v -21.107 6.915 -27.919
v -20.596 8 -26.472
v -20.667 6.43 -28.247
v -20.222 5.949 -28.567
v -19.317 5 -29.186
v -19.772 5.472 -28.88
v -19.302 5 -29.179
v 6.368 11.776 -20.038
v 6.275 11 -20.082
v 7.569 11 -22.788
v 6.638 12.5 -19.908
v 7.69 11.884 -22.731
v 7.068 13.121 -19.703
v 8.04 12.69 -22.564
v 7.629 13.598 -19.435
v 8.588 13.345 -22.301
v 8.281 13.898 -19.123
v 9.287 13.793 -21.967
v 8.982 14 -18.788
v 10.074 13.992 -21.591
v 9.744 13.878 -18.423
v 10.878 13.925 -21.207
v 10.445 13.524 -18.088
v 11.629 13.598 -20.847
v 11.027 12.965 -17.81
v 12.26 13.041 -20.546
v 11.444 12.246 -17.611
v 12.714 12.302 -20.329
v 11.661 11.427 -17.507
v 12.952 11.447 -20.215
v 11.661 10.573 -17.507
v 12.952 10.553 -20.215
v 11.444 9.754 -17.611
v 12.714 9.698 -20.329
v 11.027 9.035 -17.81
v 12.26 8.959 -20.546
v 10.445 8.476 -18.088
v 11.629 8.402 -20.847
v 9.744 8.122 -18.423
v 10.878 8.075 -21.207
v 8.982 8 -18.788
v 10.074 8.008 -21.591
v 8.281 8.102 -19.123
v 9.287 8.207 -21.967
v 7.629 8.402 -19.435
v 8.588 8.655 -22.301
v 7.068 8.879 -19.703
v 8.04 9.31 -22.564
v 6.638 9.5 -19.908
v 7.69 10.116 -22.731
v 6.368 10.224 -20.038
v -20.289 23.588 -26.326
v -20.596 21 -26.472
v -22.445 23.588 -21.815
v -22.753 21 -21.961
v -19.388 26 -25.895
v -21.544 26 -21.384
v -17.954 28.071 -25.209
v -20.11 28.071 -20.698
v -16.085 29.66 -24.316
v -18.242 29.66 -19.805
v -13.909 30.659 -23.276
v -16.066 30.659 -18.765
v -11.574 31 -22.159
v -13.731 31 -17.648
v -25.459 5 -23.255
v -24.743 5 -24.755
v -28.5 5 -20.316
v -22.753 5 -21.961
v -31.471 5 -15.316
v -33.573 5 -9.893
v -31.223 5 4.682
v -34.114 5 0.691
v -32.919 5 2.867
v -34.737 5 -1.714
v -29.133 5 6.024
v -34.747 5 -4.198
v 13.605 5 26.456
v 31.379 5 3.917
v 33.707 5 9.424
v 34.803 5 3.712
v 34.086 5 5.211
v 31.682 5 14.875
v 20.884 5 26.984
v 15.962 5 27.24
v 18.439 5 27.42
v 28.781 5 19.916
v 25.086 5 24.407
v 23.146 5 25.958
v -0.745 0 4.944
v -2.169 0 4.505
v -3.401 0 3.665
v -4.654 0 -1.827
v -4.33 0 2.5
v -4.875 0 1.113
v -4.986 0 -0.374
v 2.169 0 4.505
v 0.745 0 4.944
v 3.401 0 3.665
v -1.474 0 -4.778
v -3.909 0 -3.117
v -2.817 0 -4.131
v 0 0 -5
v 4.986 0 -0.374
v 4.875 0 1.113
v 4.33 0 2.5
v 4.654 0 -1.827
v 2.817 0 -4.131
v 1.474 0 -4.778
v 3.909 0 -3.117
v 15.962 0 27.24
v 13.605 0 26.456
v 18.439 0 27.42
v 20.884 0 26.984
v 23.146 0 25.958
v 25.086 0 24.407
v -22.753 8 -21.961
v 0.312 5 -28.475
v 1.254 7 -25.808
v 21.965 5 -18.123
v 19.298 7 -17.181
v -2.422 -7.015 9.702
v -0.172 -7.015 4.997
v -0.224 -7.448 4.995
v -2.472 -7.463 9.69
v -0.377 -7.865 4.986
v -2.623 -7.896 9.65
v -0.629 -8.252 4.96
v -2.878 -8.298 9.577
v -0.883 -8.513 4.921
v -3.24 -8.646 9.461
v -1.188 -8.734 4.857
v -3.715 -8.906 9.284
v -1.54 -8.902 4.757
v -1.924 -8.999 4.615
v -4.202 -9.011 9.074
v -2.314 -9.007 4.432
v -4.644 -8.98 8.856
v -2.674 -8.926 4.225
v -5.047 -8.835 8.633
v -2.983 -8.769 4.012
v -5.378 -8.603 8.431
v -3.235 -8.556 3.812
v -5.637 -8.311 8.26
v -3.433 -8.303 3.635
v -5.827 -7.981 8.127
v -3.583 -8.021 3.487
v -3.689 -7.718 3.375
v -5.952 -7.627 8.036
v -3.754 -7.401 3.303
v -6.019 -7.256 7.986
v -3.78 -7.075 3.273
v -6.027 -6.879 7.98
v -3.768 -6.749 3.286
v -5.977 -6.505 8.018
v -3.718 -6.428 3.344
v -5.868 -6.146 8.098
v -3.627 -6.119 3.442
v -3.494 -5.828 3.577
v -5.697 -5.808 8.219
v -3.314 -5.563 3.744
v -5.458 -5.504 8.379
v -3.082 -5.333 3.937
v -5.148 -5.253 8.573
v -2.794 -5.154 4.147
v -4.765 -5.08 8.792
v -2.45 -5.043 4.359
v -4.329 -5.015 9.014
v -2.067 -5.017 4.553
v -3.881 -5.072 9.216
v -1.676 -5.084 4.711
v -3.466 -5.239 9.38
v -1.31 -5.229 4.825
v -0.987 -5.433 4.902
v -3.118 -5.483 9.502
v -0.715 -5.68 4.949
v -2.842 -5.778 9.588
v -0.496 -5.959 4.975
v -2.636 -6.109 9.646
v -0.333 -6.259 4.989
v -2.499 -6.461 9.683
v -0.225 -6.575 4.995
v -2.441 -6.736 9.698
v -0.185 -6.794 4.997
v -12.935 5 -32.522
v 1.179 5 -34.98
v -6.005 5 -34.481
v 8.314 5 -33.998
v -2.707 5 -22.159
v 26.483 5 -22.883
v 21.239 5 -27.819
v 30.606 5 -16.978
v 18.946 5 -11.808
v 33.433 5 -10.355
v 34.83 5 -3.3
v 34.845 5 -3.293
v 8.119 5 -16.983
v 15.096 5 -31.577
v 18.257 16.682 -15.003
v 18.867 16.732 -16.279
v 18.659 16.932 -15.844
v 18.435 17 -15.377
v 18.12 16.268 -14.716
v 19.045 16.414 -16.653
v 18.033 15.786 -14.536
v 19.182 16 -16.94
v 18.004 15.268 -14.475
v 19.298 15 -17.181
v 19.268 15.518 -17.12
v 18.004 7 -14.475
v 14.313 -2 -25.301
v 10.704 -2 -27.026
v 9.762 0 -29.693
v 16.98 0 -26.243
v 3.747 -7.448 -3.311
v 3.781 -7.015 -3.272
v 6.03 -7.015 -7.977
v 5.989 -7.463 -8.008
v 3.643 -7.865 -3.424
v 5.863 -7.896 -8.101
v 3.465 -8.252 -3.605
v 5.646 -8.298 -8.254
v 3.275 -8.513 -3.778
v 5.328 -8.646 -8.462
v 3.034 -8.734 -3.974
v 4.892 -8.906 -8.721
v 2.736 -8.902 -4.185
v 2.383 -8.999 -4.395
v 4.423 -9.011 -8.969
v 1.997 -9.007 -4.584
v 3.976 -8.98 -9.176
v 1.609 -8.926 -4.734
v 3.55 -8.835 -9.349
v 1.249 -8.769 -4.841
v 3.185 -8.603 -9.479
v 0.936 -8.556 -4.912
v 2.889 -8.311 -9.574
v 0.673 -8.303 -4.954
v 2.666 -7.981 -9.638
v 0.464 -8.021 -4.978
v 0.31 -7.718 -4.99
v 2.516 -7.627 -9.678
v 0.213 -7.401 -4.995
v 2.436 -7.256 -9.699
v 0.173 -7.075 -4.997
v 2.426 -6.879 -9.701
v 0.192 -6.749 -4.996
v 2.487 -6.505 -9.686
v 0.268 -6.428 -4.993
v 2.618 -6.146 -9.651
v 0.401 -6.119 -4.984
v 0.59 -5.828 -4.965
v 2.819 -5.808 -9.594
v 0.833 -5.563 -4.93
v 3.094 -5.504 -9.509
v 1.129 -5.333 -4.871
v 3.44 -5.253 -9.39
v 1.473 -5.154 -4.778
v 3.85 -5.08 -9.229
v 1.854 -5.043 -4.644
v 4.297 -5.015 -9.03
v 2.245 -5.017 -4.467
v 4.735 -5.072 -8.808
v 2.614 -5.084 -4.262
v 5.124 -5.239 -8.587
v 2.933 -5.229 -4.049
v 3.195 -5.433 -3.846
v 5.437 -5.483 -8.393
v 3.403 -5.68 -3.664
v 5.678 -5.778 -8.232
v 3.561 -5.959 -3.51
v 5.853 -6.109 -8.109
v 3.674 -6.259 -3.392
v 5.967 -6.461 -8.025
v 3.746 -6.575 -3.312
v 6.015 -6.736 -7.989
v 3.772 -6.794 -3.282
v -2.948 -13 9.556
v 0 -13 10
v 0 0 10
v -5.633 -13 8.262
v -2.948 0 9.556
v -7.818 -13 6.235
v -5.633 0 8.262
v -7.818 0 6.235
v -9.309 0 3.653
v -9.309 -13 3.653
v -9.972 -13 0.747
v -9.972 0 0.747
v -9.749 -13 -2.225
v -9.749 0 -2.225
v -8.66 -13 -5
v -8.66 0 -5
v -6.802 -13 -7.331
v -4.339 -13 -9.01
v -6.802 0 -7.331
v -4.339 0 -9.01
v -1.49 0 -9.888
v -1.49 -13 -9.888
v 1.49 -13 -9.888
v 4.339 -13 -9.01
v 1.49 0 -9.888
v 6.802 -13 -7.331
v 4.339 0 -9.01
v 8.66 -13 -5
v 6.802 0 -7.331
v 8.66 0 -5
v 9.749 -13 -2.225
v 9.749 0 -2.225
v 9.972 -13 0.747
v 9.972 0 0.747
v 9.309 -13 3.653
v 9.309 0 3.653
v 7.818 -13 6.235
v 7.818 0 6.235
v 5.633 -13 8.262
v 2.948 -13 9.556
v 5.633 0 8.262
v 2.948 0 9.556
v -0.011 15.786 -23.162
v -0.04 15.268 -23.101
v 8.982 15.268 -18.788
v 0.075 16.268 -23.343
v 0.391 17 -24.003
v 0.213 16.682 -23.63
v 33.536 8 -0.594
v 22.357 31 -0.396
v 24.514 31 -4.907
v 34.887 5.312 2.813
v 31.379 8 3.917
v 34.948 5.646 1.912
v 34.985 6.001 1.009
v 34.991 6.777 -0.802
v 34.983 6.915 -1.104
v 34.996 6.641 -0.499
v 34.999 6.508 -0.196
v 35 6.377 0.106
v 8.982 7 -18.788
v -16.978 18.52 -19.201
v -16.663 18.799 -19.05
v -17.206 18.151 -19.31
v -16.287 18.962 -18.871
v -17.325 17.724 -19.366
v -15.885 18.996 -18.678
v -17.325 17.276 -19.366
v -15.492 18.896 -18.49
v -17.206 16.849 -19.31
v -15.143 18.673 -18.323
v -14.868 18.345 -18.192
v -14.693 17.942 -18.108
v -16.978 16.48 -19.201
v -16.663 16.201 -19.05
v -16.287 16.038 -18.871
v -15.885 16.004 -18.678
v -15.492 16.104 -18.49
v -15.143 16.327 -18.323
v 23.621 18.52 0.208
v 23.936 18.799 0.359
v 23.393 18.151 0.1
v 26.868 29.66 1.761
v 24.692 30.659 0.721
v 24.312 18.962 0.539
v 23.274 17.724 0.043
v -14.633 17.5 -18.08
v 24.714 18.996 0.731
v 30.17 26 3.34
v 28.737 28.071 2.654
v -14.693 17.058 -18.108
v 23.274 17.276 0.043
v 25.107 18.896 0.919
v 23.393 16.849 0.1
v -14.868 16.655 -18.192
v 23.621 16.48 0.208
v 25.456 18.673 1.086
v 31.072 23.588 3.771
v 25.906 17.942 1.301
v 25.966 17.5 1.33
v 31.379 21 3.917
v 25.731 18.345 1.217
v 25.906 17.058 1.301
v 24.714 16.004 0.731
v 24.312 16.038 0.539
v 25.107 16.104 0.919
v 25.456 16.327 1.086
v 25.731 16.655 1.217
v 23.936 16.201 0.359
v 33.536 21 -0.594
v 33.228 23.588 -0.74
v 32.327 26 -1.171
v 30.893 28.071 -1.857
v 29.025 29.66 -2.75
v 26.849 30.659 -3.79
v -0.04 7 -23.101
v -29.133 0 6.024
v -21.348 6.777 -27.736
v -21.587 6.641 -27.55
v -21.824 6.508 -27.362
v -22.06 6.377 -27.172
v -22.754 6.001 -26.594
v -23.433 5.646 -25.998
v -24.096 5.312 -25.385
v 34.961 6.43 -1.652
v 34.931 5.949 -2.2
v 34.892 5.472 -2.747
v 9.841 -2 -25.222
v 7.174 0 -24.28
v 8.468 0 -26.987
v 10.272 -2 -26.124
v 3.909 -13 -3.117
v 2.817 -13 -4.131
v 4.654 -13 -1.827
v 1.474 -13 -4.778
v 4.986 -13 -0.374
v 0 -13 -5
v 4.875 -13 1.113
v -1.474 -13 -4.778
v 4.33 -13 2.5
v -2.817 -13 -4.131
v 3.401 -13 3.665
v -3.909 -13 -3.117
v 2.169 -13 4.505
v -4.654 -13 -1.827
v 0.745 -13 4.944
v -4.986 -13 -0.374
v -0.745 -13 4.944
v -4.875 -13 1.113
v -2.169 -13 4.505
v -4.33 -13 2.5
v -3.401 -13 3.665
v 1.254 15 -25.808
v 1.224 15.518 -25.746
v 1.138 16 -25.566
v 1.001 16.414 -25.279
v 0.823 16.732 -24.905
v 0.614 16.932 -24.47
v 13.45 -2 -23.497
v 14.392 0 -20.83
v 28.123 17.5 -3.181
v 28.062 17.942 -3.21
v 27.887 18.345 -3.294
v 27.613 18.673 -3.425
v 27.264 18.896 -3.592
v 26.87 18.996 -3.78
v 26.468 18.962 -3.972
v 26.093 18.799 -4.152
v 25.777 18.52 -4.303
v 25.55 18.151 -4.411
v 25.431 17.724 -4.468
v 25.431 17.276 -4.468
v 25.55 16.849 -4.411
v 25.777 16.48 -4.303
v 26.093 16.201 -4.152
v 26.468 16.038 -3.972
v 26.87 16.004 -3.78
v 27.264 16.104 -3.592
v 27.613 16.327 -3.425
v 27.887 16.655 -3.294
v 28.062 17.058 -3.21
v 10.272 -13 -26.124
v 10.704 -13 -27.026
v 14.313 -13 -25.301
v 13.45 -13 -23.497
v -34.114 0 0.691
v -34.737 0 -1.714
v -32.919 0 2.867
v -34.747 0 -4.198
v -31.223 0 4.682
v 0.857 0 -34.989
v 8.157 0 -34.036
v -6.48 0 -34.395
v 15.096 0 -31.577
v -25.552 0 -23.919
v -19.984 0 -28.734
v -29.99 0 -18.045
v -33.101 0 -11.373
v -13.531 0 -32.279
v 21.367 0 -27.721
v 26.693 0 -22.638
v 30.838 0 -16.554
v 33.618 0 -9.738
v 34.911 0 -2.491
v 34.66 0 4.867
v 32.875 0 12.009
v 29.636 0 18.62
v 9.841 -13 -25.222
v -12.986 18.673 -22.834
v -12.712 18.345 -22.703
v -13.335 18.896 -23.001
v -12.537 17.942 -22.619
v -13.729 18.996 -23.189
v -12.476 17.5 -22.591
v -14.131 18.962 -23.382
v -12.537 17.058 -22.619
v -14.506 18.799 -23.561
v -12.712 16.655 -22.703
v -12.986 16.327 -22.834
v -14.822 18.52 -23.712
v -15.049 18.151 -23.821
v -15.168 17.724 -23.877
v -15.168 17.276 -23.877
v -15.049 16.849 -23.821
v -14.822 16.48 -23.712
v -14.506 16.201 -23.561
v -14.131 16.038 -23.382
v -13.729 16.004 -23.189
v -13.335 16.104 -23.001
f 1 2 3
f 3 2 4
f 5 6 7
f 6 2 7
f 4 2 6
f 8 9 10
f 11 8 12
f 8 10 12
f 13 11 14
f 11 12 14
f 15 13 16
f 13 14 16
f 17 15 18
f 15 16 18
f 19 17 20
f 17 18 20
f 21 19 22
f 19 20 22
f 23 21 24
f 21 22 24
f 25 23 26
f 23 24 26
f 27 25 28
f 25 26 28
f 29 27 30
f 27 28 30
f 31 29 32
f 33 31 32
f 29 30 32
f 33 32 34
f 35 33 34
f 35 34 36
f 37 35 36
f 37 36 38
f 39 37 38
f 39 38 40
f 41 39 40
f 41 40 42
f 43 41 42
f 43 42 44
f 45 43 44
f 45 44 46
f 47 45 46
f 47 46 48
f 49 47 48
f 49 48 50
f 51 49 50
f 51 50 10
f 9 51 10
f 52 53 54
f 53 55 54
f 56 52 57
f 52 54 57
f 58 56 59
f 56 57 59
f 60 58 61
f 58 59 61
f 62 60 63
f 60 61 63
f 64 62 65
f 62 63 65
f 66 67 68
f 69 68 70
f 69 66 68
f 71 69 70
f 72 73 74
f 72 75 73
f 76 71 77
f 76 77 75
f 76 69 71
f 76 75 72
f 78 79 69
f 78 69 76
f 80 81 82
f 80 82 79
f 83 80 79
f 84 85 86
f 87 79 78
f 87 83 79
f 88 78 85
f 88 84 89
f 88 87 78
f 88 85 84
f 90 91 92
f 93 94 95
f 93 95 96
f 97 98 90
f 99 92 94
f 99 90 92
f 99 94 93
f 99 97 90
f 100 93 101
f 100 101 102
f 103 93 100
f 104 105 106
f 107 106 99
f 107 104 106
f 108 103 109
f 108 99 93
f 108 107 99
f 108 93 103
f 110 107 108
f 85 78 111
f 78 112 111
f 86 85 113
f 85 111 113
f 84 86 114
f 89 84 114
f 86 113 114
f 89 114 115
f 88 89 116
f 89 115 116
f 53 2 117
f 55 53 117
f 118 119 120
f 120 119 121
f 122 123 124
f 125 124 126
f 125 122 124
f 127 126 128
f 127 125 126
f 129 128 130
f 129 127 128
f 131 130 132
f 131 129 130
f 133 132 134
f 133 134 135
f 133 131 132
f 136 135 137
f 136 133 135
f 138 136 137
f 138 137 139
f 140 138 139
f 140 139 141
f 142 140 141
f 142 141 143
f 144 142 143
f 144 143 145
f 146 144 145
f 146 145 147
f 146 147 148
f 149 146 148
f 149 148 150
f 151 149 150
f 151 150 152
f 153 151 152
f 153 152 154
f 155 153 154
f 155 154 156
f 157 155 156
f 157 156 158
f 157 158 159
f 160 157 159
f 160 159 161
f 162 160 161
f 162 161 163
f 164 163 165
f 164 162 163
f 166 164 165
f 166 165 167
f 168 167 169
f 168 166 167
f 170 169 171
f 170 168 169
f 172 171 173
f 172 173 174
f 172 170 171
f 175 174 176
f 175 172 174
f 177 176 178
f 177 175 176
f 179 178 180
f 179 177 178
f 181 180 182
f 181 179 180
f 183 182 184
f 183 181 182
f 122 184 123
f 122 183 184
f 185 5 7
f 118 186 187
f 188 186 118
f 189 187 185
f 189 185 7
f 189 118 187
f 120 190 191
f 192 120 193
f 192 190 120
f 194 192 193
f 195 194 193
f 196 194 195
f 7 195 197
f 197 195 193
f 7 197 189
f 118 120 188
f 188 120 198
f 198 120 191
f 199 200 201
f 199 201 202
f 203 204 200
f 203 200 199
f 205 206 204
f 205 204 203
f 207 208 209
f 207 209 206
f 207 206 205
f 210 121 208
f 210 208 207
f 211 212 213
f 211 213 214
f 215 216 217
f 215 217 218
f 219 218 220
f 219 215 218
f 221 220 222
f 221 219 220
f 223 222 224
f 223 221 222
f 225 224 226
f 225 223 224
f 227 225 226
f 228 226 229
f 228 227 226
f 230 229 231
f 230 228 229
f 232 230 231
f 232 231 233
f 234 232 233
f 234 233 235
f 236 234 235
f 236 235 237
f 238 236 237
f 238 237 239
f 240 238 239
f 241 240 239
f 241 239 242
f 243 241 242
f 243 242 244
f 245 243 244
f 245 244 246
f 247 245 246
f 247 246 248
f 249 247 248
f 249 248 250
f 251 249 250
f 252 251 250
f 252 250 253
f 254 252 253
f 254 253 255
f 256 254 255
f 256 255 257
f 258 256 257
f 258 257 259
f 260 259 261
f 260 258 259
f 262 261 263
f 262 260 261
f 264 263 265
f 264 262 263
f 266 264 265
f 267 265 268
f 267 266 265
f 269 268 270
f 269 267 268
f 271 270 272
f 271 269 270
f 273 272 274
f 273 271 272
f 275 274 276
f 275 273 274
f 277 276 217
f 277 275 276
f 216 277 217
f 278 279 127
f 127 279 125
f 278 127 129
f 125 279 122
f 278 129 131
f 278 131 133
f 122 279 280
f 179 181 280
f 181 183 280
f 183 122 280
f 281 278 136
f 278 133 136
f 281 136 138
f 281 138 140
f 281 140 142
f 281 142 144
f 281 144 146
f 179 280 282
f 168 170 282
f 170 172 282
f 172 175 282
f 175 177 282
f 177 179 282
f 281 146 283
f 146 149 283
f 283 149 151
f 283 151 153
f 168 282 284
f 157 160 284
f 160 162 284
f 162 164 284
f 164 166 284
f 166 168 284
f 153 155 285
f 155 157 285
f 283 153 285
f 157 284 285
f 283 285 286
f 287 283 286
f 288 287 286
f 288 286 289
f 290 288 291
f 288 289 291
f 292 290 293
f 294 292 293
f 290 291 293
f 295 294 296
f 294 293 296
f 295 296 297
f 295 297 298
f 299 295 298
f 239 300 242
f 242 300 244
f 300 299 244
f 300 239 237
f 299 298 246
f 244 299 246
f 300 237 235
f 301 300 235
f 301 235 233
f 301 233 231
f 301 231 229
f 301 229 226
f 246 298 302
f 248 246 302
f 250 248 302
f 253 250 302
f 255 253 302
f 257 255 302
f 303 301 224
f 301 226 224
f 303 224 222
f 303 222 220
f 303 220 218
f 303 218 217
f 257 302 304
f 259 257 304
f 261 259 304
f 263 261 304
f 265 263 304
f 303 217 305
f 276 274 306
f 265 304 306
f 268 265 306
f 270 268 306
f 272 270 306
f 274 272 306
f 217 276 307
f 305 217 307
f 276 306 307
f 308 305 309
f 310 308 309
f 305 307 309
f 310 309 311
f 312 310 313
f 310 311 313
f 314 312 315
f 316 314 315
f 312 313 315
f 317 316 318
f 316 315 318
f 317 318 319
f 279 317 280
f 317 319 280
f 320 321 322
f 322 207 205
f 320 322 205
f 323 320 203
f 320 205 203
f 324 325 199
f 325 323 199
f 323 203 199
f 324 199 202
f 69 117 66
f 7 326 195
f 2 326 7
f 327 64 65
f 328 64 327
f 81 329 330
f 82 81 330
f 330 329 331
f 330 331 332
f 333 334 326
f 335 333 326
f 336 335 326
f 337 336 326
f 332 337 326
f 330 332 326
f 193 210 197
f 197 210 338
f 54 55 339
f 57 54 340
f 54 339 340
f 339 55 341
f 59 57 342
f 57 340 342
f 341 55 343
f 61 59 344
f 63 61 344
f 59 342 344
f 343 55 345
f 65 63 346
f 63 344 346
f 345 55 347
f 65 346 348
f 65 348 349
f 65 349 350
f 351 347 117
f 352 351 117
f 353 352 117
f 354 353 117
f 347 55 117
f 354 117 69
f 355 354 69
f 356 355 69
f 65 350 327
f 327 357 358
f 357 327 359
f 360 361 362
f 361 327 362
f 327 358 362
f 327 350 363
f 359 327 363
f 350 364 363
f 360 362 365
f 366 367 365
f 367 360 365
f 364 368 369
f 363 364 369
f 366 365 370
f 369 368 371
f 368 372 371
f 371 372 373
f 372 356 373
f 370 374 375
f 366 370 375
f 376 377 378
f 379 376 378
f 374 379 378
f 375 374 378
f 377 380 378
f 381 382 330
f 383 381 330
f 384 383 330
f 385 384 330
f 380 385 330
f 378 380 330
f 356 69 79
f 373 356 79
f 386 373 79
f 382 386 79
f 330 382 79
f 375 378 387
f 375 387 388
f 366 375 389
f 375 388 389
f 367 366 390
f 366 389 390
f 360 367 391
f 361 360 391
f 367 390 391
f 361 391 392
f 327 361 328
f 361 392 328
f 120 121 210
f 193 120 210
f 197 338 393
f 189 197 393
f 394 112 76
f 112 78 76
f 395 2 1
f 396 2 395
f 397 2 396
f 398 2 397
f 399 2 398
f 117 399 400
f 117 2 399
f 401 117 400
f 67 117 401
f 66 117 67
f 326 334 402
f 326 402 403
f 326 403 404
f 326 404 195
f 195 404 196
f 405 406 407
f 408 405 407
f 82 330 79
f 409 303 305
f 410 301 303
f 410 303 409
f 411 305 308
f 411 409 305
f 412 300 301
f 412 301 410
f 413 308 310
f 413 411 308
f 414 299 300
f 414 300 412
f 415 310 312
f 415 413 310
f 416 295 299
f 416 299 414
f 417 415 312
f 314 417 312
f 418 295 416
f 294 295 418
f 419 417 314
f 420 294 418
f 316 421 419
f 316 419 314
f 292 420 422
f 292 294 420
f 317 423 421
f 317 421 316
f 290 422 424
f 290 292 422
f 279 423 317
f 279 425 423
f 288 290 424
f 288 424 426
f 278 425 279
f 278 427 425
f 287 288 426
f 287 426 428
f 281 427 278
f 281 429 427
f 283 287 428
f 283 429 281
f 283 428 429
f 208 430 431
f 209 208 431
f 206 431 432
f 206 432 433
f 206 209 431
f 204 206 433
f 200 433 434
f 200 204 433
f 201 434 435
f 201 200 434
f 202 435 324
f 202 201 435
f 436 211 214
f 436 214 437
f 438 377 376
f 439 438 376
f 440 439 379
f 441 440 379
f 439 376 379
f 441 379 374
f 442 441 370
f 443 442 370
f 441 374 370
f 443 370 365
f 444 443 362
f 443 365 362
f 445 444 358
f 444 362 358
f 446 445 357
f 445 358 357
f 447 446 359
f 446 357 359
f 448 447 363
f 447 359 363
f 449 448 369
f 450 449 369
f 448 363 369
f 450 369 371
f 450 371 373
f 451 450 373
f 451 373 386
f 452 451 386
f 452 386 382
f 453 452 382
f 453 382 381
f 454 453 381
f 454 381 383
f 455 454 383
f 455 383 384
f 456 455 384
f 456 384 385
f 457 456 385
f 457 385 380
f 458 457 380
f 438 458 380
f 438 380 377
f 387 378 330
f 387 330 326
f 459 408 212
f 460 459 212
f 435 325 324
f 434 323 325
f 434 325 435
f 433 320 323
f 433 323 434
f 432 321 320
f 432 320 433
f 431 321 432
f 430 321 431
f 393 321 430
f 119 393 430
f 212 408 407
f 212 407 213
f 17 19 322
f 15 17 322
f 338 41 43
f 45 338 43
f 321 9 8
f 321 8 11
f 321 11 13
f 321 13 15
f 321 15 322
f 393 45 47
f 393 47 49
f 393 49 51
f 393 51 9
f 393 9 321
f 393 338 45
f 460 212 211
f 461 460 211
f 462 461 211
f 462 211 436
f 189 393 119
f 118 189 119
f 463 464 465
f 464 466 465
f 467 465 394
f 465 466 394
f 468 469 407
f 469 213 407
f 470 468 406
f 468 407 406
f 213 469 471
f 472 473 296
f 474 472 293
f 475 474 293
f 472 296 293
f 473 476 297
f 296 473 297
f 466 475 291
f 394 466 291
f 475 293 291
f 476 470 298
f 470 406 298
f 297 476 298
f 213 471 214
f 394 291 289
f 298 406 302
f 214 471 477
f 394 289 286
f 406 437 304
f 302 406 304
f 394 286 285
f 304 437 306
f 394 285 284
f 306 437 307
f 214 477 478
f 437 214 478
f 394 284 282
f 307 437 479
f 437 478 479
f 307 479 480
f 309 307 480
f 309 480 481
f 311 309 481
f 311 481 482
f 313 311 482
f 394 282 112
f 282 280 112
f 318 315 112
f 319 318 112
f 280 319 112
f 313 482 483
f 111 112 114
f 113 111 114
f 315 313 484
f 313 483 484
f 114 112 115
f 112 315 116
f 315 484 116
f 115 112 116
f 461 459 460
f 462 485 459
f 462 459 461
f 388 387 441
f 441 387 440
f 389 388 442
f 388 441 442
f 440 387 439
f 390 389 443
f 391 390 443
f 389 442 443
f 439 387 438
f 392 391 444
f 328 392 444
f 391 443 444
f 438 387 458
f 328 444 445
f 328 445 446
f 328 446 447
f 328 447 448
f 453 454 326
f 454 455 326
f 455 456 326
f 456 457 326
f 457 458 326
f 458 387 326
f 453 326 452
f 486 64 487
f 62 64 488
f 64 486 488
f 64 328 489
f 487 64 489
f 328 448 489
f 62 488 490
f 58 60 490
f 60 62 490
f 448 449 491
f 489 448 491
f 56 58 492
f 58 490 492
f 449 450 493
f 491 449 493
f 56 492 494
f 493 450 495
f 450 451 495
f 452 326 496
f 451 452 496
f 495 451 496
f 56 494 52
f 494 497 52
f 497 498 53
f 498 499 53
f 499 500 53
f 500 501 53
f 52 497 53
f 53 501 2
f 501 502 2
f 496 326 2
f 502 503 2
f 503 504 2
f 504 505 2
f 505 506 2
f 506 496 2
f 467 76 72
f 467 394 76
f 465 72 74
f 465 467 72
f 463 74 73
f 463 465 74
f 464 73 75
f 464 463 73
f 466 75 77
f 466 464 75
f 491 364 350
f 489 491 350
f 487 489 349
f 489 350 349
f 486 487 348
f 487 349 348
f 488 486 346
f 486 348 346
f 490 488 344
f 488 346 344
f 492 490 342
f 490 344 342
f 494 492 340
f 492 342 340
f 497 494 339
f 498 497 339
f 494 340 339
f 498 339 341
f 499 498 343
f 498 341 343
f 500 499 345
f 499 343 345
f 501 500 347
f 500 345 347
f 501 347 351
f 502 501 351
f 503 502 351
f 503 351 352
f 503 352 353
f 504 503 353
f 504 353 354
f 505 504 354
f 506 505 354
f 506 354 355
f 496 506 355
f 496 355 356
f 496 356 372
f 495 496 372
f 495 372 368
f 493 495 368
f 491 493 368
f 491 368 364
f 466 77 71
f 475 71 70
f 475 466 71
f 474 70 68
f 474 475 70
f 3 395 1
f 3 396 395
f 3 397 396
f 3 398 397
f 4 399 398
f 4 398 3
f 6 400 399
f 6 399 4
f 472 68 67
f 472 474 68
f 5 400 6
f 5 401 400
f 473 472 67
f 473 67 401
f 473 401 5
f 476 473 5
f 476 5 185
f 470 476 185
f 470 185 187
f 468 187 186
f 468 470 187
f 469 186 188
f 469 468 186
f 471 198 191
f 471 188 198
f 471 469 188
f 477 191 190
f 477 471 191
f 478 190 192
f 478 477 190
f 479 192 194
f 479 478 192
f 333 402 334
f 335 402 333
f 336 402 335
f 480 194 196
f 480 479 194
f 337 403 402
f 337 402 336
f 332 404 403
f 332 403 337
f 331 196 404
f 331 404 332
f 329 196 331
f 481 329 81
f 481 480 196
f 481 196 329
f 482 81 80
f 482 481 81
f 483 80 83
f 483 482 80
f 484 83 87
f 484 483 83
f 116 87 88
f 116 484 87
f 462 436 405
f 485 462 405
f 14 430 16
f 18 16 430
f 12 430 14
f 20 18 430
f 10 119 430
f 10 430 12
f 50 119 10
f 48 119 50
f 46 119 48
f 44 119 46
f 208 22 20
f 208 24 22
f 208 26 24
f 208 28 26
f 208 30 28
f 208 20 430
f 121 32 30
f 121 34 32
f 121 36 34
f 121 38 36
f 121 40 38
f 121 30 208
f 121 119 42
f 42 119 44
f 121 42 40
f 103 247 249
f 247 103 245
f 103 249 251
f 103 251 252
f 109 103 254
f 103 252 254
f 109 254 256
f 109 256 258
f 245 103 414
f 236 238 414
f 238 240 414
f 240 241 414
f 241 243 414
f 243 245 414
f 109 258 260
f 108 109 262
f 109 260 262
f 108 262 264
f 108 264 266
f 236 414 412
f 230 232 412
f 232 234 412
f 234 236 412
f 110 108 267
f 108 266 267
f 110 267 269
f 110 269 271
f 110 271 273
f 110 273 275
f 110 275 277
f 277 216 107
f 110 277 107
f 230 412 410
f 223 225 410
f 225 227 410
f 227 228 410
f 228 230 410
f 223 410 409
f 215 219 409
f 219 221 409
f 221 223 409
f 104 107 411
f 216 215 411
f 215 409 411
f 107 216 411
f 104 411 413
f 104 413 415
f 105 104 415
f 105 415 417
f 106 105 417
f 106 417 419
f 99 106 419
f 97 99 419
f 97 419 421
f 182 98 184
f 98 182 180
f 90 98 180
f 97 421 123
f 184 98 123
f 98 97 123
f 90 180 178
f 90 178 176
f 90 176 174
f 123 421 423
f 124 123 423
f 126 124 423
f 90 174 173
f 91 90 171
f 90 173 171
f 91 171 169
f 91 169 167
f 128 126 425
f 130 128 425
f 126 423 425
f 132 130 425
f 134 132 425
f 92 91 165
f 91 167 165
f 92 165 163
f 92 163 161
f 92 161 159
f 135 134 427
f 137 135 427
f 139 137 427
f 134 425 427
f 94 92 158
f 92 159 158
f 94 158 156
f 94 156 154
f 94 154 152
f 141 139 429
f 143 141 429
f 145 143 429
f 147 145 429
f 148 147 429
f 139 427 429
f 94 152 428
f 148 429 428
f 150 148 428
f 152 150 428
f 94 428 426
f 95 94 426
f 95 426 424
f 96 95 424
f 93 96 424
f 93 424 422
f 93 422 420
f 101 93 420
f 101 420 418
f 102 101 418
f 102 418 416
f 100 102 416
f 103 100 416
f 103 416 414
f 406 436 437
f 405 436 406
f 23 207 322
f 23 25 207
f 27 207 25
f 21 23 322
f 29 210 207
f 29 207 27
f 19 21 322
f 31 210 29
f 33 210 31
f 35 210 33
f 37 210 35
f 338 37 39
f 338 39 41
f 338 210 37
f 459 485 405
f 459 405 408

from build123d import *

# Parameters (mm, degrees)
ESBO_O1_R                 = 35
RESSALTO_EXTRUS_O1_DEPTH  = 5
ESBO_O3_R                 = 10
RESSALTO_EXTRUS_O3_DEPTH  = 13
ESBO_O4_R                 = 5
CORTE_EXTRUS_O1_DEPTH     = 13
RESSALTO_EXTRUS_O5_DEPTH  = 13
CORTE_EXTRUS_O6_START     = -11
CORTE_EXTRUS_O6_OUTLINE_R = 2
CORTE_EXTRUS_O6_DEPTH     = 22
CORTE_EXTRUS_O8_DEPTH     = 68.852738868
RESSALTO_EXTRUS_O7_DEPTH  = 26
ESBO_O19_R                = 1.5
CORTE_EXTRUS_O9_DEPTH     = 26
FILETE1_R                 = 10
FILETE2_R                 = 10
RESSALTO_EXTRUS_O9_DEPTH  = 12
CORTE_EXTRUS_O11_REACH    = 75.407
ESBO_O26_R                = 3
CHANFRO7_SIZE             = 3
CHANFRO8_SIZE             = 3
CHANFRO9_SIZE             = 3
CHANFRO10_SIZE            = 2
FILETE5_R                 = 2
FILETE6_R                 = 2
CHANFRO11_SIZE            = 2


with BuildPart() as part:
    # Esboço1 → Ressalto-extrusão1 (new body)
    with BuildSketch(Plane(origin=(0, 0, 0), x_dir=(1, 0, 0), z_dir=(0, 1, 0))):
        with Locations(Location((0, 0, 0), (0, 0, 270))):
            Circle(ESBO_O1_R)
    extrude(amount=RESSALTO_EXTRUS_O1_DEPTH)

    # Esboço3 → Ressalto-extrusão3 (add)
    with BuildSketch(Plane.XZ):
        with Locations(Location((0, 0, 0), (0, 0, 90))):
            Circle(ESBO_O3_R)
    extrude(amount=RESSALTO_EXTRUS_O3_DEPTH)

    # Esboço4 → Corte-extrusão1 (cut)
    with BuildSketch(Plane(origin=(0, -13, 0), x_dir=(-1, 0, 0), z_dir=(0, -1, 0))):
        with Locations(Location((0, 0, 0), (0, 0, 90))):
            Circle(ESBO_O4_R)
    extrude(amount=-CORTE_EXTRUS_O1_DEPTH, mode=Mode.SUBTRACT)

    # Esboço11 → Ressalto-extrusão5 (add)
    with BuildSketch(Plane.XZ):
        Polygon((10.27244843, -26.12425699), (10.703764509, -27.026457876), (14.312568056, -25.301193562), (13.449935899, -23.496791788), (9.841132351, -25.222056103), align=None)
    extrude(amount=RESSALTO_EXTRUS_O5_DEPTH)

    # Corte-extrusão6: read off the stored shape, not the designer's step
    # Corte-extrusão6 outline → Corte-extrusão6 (cut)
    with BuildSketch(Plane(origin=(0, 0, 0), x_dir=(0.9022008868624063, 0, 0.4313160786994702), z_dir=(0.43131607869947014, 0, -0.9022008868624064)).offset(CORTE_EXTRUS_O6_START)):
        with Locations((0, 7.014981428)):
            Circle(CORTE_EXTRUS_O6_OUTLINE_R)
    extrude(amount=CORTE_EXTRUS_O6_DEPTH, mode=Mode.SUBTRACT)

    # 3DSketch5 → Corte-extrusão8 (cut, through all)
    with BuildSketch(Plane(origin=(-8.247671749, -6.480100675, 16.008238046), x_dir=(0.7047714310013795, 0.6243195323179013, 0.3369307816312202), z_dir=(-0.43131607869947175, 0, 0.9022008868624055))):
        Polygon((0, 0), (-30.606987597, 24.461465293), (-10.703733889, 49.365069068), (51.063459474, 0), (31.160205765, -24.903603774), align=None)
    extrude(amount=CORTE_EXTRUS_O8_DEPTH, mode=Mode.SUBTRACT)

    # Esboço18 → Ressalto-extrusão7 (add)
    with BuildSketch(Plane(origin=(0, 5, 0), x_dir=(1, 0, 0), z_dir=(0, 1, 0))):
        Polygon((4.313160787, 9.022008869), (31.379187393, -3.917473492), (33.535767786, 0.593530942), (-20.596285425, 26.472495664), (-22.752865819, 21.96149123), align=None)
    extrude(amount=RESSALTO_EXTRUS_O7_DEPTH)

    # Esboço19 → Corte-extrusão9 (cut)
    with BuildSketch(Plane(origin=(4.313160787, 0, -9.022008869), x_dir=(0.9022008868624055, 0, 0.43131607869947175), z_dir=(-0.43131607869947175, 0, 0.9022008868624055))):
        with Locations((-22.5, 17.5)):
            Circle(ESBO_O19_R)
        with Locations((22.5, 17.5)):
            Circle(ESBO_O19_R)
    extrude(amount=-CORTE_EXTRUS_O9_DEPTH, mode=Mode.SUBTRACT)

    # Filete1
    filete1_edges = [part.edges().sort_by_distance(p)[0] for p in [
        (32.45747759, 31, 1.661971275),
        (-21.674575622, 31, -24.216993447),
    ]]
    fillet(filete1_edges, radius=FILETE1_R)

    # Filete2
    filete2_edges = [part.edges().sort_by_distance(p)[0] for p in [
        (19.317369696, 2.5, 29.18628493),
        (-34.844748529, 2.5, 3.292946997),
    ]]
    fillet(filete2_edges, radius=FILETE2_R)

    # Esboço25 → Ressalto-extrusão9 (add)
    with BuildSketch(Plane(origin=(0, 5, 0), x_dir=(1, 0, 0), z_dir=(0, 1, 0))):
        Polygon((8.981926733, 18.787851102), (-0.040082135, 23.101011889), (1.253866101, 25.80761455), (19.297883838, 17.181292976), (18.003935602, 14.474690315), align=None)
    extrude(amount=RESSALTO_EXTRUS_O9_DEPTH)

    # Esboço26 → Corte-extrusão11 (cut, up to next)
    with BuildSketch(Plane(origin=(10.275874969, 0, -21.494453763), x_dir=(-0.902200886862406, 0, -0.4313160786994711), z_dir=(0.4313160786994711, 0, -0.902200886862406)), mode=Mode.PRIVATE) as corte_extrus_o11_sk1:
        with Locations((0, 11)):
            Circle(ESBO_O26_R)
    corte_extrus_o11_tool1 = extrude(corte_extrus_o11_sk1.sketch, amount=-CORTE_EXTRUS_O11_REACH, mode=Mode.PRIVATE) & part.part
    add(corte_extrus_o11_tool1.solids().sort_by_distance((10.275875, 11, -21.494454))[0], mode=Mode.SUBTRACT)

    # Chanfro7
    chanfro7_edges = [part.edges().sort_by_distance(p)[0] for p in [
        (6.46974118, 5, -13.533013303),
    ]]
    chamfer(chanfro7_edges, length=CHANFRO7_SIZE)

    # Chanfro8
    # the kernel refuses this chamfer: 3 mm, written as the material it adds along each edge
    with BuildSketch(Plane(origin=(38.157340689, 5, -10.26065762), x_dir=(0.9022008868624055, 0, 0.43131607869947186), z_dir=(-0.4313160786994719, 0, 0.9022008868624055))) as chanfro8_piece_1_section:
        Polygon((CHANFRO8_SIZE, 0), (0, CHANFRO8_SIZE), (0, 0), align=None)
    chanfro8_piece_1 = extrude(amount=15.715048964, mode=Mode.PRIVATE)
    chanfro8_piece_1 = split(chanfro8_piece_1, bisect_by=Plane(origin=(36.493528356, 1.142475518, -6.780395611), z_dir=(-0.30498652408318644, -0.7071067811865479, 0.6379523650929244)), keep=Keep.TOP, mode=Mode.PRIVATE)
    chanfro8_piece_1 = chanfro8_piece_1 & Plane(origin=(0, 5, 0), x_dir=(0, 0, 1), z_dir=(0, -1, 0)) * Cylinder(35, 44, mode=Mode.PRIVATE)
    chanfro8_piece_1 = split(chanfro8_piece_1, bisect_by=Plane(origin=(33.535767786, 5, -0.593530942), z_dir=(0.4313160786994711, 0, -0.9022008868624058)), keep=Keep.TOP, mode=Mode.PRIVATE)
    add(chanfro8_piece_1)
    with BuildSketch(Plane(origin=(38.157340689, 5, -10.26065762), x_dir=(0.9022008868624055, 0, 0.43131607869947186), z_dir=(-0.4313160786994719, 0, 0.9022008868624055))) as chanfro8_piece_2_section:
        Polygon((CHANFRO8_SIZE, 0), (0, CHANFRO8_SIZE), (0, 0), align=None)
    chanfro8_piece_2 = extrude(amount=15.715048964, mode=Mode.PRIVATE)
    chanfro8_piece_2 = split(chanfro8_piece_2, bisect_by=Plane(origin=(36.493528356, 1.142475518, -6.780395611), z_dir=(-0.30498652408318644, -0.7071067811865479, 0.6379523650929244)), keep=Keep.TOP, mode=Mode.PRIVATE)
    chanfro8_piece_2 = chanfro8_piece_2 & Plane(origin=(0, 5, 0), x_dir=(0, 0, 1), z_dir=(0, -1, 0)) * Cylinder(35, 44, mode=Mode.PRIVATE)
    chanfro8_piece_2 = split(chanfro8_piece_2, bisect_by=Plane(origin=(33.535767786, 5, -0.593530942), z_dir=(-0.4313160786994711, 0, 0.9022008868624058)), keep=Keep.TOP, mode=Mode.PRIVATE)
    add(chanfro8_piece_2)

    # Chanfro9
    # the kernel refuses this chamfer: 3 mm, written as the material it adds along each edge
    with BuildSketch(Plane(origin=(-22.752865819, 5, -21.96149123), x_dir=(0, 1, 0), z_dir=(0.431316078699471, 0, -0.902200886862406))) as chanfro9_piece_1_section:
        Polygon((CHANFRO9_SIZE, 0), (0, -CHANFRO9_SIZE), (0, 0), align=None)
    chanfro9_piece_1 = extrude(amount=15.715048964, mode=Mode.PRIVATE)
    chanfro9_piece_1 = split(chanfro9_piece_1, bisect_by=Plane(origin=(-20.596285425, 5, -26.472495664), z_dir=(-0.4313160786994711, 0, 0.9022008868624058)), keep=Keep.TOP, mode=Mode.PRIVATE)
    chanfro9_piece_1 = split(chanfro9_piece_1, bisect_by=Plane(origin=(-21.027601504, 9, -25.570294777), z_dir=(-0.30498652408290505, -0.7071067811867798, 0.6379523650928014)), keep=Keep.TOP, mode=Mode.PRIVATE)
    chanfro9_piece_1 = chanfro9_piece_1 & Plane(origin=(0, 5, 0), x_dir=(0, 0, 1), z_dir=(0, -1, 0)) * Cylinder(35, 44, mode=Mode.PRIVATE)
    add(chanfro9_piece_1)
    with BuildSketch(Plane(origin=(-22.752865819, 5, -21.96149123), x_dir=(0, 1, 0), z_dir=(0.431316078699471, 0, -0.902200886862406))) as chanfro9_piece_2_section:
        Polygon((CHANFRO9_SIZE, 0), (0, -CHANFRO9_SIZE), (0, 0), align=None)
    chanfro9_piece_2 = extrude(amount=15.715048964, mode=Mode.PRIVATE)
    chanfro9_piece_2 = split(chanfro9_piece_2, bisect_by=Plane(origin=(-20.596285425, 5, -26.472495664), z_dir=(0.4313160786994711, 0, -0.9022008868624058)), keep=Keep.TOP, mode=Mode.PRIVATE)
    chanfro9_piece_2 = split(chanfro9_piece_2, bisect_by=Plane(origin=(-21.027601504, 9, -25.570294777), z_dir=(-0.30498652408290505, -0.7071067811867798, 0.6379523650928014)), keep=Keep.TOP, mode=Mode.PRIVATE)
    chanfro9_piece_2 = chanfro9_piece_2 & Plane(origin=(0, 5, 0), x_dir=(0, 0, 1), z_dir=(0, -1, 0)) * Cylinder(35, 44, mode=Mode.PRIVATE)
    add(chanfro9_piece_2)

    # Chanfro10
    chanfro10_edges = [part.edges().sort_by_distance(p)[0] for p in [
        (18.65090972, 5, -15.827991645),
        (10.275874969, 5, -21.494453763),
        (0.606891983, 5, -24.454313219),
        (8.981926733, 5, -18.787851102),
    ]]
    chamfer(chanfro10_edges, length=CHANFRO10_SIZE)

    # Filete5
    filete5_edges = [part.edges().sort_by_distance(p)[0] for p in [
        (10.275874969, 17, -21.494453763),
    ]]
    fillet(filete5_edges, radius=FILETE5_R)

    # Filete6
    # the kernel refuses this fillet: 2 mm, written as the material it takes off along each edge
    with BuildSketch(Plane(origin=(21.910580039, 17, -12.607036909), x_dir=(0.4313160786994712, -7.105427357600661e-14, -0.9022008868624057), z_dir=(-0.9022008868624058, 0, -0.4313160786994713))) as filete6_piece_1:
        with BuildLine():
            CenterArc((2, 1.732050808), FILETE6_R, 180, 60)
            Line((0, 1.732050808), (-0.04, 1.732050808))
            Line((-0.04, 1.732050808), (-0.04, 0))
            Line((-0.04, 0), (0, -0.04))
            ThreePointArc((0, -0.04), (0.5, -0.04), (0.98, -0.034641016))
            Line((0.98, -0.034641016), (1, 0))
        make_face()
    extrude(amount=28.660254038, mode=Mode.SUBTRACT)

    # Chanfro11
    chanfro11_edges = [part.edges().sort_by_distance(p)[0] for p in [
        (10.27244843, 0, -26.12425699),
        (12.508166282, 0, -26.163825719),
        (13.881251977, 0, -24.398992675),
        (11.645534125, 0, -24.359423945),
    ]]
    chamfer(chanfro11_edges, length=CHANFRO11_SIZE)


solid = part.part
